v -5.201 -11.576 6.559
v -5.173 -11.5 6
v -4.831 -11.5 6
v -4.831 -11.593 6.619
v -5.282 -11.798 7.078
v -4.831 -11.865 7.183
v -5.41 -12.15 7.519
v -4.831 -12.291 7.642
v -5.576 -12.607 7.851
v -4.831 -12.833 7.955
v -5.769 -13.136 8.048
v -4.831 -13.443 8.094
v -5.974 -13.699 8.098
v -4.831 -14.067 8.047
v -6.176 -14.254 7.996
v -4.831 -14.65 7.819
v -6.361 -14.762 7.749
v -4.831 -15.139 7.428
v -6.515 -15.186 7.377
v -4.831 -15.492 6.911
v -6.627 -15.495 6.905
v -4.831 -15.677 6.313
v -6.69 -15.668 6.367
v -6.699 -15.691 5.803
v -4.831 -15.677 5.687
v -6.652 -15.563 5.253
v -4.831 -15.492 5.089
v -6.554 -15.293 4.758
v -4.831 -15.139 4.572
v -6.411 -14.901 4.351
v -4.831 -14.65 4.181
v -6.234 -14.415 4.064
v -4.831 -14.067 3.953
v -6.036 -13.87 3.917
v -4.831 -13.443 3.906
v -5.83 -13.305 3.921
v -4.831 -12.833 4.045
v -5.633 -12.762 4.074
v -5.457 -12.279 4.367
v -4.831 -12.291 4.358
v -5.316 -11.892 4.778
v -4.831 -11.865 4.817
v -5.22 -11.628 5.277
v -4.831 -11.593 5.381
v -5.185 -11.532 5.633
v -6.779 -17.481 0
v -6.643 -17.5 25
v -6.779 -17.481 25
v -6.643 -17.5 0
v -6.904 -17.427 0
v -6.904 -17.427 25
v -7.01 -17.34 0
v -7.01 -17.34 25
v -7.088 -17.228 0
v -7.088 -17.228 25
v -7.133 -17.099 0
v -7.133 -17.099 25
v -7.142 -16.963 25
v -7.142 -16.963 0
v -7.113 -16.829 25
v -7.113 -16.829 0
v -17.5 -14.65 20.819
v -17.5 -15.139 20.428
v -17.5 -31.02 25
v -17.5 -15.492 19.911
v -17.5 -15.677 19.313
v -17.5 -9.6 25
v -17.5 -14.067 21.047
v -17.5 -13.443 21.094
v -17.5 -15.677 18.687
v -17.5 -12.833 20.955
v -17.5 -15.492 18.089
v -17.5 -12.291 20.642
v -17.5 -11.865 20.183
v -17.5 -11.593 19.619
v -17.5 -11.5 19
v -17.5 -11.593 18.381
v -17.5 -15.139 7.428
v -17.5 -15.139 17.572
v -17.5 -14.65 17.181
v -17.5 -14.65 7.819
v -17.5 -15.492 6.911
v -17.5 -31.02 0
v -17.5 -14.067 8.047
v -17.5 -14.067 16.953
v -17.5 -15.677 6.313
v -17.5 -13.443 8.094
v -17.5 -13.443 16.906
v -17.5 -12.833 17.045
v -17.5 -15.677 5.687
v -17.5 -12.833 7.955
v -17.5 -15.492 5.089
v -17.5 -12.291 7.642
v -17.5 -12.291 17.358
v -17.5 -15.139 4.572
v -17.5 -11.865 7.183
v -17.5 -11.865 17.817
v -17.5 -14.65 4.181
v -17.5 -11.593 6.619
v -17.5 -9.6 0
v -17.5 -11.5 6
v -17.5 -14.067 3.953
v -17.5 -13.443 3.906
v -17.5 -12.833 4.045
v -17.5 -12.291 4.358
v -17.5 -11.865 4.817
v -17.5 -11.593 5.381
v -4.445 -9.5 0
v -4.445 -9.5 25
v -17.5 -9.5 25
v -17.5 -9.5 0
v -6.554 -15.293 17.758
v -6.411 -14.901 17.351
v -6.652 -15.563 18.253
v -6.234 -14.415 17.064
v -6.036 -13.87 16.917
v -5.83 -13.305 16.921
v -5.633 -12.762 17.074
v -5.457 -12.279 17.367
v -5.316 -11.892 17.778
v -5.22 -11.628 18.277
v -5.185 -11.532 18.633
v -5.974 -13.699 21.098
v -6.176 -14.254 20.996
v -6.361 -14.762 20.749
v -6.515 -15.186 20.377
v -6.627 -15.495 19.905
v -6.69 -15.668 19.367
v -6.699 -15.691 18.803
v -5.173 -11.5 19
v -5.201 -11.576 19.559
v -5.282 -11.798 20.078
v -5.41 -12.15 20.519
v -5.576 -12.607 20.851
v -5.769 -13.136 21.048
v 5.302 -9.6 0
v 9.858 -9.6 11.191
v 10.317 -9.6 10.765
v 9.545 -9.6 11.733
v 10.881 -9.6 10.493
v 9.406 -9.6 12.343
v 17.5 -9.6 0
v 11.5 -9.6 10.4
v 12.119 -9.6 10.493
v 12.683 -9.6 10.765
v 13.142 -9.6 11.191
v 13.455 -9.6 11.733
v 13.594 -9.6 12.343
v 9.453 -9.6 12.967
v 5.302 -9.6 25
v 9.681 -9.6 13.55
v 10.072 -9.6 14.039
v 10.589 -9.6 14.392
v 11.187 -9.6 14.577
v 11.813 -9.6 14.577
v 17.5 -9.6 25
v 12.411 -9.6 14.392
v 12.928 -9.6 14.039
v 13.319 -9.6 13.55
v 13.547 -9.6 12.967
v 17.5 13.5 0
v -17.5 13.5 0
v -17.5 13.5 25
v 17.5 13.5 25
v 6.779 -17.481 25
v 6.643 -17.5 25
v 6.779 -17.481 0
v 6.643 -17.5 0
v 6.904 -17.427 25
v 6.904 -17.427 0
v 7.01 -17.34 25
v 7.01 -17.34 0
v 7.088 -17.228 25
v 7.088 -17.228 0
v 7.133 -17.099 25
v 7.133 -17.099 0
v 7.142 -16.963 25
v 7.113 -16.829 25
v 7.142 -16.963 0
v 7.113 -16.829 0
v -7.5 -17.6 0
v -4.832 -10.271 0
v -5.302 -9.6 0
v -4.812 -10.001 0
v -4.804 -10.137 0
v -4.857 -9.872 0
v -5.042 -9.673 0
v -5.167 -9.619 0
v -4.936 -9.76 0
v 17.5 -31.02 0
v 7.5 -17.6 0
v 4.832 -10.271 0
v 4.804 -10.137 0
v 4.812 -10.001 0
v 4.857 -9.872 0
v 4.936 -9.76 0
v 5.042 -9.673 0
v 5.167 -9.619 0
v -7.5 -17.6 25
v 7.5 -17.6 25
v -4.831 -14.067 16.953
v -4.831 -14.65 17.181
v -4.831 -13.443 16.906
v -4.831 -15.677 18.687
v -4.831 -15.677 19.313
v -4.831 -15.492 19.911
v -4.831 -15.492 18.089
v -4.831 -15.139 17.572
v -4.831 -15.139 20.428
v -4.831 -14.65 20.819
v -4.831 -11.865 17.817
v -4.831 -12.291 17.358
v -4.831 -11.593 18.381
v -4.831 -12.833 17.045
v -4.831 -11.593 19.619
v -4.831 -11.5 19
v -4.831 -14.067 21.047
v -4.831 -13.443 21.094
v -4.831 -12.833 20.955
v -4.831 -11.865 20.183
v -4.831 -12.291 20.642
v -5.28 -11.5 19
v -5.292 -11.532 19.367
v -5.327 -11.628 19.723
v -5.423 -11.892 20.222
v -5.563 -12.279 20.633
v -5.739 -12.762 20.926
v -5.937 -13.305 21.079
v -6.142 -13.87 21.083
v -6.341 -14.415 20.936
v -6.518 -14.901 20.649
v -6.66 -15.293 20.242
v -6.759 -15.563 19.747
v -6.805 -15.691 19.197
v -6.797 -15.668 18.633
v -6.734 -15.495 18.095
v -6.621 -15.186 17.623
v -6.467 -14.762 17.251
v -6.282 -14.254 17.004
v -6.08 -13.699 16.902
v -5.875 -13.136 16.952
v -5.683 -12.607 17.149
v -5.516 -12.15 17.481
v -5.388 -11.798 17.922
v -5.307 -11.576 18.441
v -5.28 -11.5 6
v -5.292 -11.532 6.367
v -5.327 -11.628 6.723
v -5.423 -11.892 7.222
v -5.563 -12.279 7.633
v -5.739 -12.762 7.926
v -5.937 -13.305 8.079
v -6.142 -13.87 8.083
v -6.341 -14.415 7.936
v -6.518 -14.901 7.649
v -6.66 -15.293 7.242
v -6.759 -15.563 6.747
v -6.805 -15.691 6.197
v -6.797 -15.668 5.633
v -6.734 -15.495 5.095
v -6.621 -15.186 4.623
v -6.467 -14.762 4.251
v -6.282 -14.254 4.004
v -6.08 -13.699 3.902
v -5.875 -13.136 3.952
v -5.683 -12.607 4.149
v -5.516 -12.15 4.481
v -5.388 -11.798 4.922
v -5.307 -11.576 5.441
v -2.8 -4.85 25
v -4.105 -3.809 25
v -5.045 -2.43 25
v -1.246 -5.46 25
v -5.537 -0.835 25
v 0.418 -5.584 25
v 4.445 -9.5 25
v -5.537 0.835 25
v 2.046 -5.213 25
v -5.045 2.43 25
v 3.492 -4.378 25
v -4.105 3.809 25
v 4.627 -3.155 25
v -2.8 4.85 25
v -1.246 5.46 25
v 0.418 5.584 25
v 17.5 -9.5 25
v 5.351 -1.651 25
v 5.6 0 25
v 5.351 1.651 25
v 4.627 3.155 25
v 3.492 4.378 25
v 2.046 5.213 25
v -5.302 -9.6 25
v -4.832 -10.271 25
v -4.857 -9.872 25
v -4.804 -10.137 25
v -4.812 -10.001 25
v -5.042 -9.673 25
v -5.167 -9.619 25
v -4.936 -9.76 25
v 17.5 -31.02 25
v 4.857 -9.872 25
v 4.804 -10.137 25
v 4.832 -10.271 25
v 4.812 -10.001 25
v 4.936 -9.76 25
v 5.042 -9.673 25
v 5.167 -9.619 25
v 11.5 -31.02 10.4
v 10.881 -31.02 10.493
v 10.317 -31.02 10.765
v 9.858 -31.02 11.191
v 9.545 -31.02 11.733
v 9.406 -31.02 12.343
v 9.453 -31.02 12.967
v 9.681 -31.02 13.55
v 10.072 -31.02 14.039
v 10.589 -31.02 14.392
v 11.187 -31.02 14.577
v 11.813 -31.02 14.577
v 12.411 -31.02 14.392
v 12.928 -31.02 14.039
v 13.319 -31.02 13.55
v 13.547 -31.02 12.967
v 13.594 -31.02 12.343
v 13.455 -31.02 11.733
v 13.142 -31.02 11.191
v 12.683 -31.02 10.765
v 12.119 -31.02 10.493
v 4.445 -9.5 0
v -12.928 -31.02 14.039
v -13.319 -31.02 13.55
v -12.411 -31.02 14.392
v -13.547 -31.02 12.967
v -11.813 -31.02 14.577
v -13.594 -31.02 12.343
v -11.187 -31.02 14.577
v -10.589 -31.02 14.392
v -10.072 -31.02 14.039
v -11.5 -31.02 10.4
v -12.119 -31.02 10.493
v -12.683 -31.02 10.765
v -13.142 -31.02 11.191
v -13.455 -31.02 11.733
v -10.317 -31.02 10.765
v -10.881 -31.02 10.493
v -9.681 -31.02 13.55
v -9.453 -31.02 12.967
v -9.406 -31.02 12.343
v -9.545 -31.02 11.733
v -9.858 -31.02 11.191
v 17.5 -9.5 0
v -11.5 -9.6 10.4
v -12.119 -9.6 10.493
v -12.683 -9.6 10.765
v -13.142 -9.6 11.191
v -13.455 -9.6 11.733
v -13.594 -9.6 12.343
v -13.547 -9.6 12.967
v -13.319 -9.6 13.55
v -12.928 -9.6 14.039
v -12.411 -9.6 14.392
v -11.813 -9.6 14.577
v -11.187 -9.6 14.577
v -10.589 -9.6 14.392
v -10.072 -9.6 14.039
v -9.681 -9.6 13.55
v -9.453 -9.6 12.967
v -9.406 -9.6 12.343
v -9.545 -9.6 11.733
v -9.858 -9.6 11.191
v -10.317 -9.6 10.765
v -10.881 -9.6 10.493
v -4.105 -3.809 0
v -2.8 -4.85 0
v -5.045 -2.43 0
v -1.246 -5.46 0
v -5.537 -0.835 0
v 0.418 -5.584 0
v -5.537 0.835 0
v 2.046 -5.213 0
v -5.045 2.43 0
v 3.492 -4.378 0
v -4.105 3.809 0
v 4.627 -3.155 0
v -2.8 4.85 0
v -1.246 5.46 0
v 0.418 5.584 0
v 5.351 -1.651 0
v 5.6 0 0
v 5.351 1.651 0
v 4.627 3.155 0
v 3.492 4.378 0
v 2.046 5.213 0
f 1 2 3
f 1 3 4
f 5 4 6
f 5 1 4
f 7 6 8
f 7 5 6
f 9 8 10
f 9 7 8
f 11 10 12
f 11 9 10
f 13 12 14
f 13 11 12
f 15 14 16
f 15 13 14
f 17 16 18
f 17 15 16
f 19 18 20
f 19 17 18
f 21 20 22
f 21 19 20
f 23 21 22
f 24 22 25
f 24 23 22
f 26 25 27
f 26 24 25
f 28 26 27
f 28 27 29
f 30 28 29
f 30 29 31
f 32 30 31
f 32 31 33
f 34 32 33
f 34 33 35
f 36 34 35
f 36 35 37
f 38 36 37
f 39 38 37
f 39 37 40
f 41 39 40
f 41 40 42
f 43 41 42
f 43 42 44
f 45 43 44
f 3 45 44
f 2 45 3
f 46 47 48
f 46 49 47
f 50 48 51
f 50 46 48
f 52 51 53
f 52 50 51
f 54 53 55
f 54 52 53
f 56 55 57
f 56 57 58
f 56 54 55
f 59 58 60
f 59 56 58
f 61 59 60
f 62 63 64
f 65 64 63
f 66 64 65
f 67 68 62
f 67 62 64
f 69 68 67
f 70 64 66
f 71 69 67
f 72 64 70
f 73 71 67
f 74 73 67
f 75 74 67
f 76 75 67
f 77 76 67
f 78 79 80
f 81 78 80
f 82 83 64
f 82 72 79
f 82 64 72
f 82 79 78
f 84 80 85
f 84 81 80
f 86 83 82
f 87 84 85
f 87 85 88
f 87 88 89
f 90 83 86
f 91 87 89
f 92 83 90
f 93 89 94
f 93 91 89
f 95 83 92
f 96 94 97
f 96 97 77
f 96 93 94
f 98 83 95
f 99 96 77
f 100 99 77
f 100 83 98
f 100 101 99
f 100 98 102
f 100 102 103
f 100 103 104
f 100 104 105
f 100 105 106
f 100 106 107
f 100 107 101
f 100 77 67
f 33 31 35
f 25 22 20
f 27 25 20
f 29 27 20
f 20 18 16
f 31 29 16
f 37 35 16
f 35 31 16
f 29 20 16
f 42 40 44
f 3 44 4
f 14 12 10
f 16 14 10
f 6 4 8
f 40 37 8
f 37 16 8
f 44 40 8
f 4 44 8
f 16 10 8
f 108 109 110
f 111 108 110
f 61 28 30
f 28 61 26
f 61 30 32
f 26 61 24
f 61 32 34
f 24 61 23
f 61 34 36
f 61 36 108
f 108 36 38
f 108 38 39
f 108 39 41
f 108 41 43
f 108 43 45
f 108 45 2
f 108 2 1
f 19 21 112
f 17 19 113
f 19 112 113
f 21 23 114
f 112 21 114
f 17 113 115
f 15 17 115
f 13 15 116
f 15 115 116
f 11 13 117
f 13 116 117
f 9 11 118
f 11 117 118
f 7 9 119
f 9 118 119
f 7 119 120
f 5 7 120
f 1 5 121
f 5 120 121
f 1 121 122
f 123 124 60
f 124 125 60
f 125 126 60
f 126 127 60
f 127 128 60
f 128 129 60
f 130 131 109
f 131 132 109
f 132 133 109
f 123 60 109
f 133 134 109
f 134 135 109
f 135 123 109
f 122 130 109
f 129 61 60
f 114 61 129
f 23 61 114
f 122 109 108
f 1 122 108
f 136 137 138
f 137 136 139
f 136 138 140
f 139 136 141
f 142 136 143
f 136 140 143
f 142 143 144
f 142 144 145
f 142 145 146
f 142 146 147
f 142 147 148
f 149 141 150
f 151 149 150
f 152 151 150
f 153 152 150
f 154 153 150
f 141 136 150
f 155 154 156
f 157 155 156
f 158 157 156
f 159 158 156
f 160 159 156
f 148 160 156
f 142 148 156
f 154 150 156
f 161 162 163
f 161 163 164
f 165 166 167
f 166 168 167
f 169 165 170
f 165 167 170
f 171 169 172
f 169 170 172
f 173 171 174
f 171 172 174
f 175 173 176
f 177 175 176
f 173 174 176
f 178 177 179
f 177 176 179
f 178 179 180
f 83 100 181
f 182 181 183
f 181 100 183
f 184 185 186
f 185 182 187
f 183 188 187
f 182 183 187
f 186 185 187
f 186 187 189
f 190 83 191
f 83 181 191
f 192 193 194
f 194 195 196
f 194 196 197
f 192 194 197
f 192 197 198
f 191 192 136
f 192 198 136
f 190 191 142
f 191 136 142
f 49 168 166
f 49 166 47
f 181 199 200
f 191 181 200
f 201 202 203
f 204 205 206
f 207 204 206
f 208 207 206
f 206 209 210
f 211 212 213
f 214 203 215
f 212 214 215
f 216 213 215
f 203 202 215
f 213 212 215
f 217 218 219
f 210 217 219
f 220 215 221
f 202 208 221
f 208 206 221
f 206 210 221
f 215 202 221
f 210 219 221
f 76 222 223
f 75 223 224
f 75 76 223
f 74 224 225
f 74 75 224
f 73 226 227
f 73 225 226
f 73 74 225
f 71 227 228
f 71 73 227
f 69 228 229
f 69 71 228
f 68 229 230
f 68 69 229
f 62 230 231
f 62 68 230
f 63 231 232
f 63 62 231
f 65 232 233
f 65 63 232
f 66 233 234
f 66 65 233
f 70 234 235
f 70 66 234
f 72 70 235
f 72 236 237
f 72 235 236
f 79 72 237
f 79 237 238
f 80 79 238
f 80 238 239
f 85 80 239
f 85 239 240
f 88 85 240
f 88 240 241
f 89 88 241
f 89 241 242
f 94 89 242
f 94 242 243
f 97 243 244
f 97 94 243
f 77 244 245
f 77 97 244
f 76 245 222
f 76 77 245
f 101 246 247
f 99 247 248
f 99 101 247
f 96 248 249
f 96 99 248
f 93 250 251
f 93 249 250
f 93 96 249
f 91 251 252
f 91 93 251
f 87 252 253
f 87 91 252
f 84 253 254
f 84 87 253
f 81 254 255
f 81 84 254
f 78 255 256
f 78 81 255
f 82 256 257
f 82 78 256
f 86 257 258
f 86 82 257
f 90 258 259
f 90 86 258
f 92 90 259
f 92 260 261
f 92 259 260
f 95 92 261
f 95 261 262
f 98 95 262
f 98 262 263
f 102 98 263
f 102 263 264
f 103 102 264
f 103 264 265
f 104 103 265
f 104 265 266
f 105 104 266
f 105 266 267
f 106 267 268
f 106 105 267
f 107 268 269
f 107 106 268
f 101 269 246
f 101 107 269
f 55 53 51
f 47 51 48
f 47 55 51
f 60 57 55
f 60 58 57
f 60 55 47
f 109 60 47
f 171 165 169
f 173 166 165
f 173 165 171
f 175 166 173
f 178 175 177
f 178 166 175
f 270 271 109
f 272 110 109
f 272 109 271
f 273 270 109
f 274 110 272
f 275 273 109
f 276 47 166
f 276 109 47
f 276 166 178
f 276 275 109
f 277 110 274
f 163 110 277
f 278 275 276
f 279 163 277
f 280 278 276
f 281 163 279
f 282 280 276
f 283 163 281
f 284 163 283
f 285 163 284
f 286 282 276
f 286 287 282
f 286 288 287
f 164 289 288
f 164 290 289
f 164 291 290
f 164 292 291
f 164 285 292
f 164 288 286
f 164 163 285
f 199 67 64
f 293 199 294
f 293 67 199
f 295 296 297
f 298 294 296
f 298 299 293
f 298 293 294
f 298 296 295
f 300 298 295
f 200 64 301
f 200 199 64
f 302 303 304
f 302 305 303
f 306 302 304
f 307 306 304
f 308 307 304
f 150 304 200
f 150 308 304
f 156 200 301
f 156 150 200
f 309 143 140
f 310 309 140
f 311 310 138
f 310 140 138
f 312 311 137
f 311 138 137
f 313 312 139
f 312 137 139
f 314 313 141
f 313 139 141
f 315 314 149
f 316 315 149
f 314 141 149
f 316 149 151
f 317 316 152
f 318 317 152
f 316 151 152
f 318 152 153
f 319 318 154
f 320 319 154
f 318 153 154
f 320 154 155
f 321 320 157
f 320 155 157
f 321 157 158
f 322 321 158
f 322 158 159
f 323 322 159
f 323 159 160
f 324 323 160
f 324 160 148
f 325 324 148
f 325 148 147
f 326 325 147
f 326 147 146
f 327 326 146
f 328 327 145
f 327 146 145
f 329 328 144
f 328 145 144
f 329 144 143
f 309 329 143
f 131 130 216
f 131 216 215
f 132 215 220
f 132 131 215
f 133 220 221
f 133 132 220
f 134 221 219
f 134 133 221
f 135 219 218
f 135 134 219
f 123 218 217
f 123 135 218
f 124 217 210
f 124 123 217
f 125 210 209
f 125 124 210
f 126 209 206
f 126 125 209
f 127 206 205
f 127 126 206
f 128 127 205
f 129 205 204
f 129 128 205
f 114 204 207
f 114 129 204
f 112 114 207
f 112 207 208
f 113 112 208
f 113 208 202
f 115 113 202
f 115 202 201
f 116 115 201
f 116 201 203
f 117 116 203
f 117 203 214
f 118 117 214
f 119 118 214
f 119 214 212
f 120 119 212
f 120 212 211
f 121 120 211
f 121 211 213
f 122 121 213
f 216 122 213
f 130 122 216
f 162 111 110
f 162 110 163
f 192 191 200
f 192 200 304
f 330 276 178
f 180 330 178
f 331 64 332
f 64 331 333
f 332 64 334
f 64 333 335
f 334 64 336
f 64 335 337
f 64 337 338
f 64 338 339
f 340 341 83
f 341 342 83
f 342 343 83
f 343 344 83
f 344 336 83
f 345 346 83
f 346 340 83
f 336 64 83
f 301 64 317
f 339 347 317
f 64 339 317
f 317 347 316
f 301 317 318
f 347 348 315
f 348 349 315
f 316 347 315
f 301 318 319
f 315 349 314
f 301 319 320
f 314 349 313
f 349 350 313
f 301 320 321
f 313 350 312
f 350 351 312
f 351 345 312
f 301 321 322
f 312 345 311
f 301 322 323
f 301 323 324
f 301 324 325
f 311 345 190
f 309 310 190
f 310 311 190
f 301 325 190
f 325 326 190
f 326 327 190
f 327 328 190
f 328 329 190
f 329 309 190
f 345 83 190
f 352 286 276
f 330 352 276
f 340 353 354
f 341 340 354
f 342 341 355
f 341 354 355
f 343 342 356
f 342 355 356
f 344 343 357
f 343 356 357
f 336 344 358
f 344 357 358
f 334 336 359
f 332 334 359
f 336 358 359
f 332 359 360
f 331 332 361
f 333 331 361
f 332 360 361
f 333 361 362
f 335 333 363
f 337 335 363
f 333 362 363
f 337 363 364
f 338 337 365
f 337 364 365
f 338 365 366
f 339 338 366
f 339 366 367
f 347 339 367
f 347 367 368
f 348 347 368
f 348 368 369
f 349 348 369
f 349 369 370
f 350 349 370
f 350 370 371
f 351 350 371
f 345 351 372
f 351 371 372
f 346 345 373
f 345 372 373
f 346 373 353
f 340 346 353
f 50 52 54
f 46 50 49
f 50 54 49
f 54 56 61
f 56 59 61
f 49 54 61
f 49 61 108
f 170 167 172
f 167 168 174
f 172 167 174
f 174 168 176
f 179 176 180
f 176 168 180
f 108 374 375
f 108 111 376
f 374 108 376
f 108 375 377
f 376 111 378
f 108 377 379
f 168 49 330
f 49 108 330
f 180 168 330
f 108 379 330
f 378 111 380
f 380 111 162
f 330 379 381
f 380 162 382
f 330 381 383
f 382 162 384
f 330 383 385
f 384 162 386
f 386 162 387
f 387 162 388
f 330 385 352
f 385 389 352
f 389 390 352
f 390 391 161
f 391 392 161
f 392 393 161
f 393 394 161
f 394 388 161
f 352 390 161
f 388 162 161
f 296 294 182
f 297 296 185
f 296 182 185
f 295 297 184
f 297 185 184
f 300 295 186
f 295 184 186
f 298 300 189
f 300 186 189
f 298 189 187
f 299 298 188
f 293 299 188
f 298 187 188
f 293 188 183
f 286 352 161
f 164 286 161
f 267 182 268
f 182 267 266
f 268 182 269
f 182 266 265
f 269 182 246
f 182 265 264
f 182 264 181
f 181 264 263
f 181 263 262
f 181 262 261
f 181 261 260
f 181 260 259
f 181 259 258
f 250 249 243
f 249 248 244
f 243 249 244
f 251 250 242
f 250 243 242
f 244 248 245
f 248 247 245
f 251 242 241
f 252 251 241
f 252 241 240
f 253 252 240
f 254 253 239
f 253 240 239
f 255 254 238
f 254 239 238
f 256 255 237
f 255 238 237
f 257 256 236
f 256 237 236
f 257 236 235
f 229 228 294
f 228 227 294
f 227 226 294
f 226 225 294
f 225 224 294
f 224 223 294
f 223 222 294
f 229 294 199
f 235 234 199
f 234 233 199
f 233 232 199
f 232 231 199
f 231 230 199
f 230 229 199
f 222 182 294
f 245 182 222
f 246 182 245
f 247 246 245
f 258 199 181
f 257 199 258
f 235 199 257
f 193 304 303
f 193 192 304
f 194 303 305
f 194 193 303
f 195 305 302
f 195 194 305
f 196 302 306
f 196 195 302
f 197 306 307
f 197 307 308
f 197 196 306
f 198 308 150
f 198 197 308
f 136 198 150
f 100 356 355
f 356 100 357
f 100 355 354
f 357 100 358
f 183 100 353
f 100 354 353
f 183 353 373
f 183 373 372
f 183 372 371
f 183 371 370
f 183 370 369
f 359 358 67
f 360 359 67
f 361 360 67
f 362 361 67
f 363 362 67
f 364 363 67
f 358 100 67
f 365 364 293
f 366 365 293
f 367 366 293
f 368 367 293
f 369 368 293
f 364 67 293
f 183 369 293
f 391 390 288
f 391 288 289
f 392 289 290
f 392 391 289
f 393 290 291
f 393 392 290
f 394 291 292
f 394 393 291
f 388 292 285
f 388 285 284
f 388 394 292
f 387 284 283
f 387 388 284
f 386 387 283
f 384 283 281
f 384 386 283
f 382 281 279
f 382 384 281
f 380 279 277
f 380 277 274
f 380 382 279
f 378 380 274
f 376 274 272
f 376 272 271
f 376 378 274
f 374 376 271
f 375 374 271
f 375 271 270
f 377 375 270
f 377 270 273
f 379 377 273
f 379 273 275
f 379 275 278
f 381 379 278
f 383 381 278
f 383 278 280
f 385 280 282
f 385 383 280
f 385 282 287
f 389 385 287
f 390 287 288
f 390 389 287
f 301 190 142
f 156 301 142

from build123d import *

# Parameters (mm, degrees)
SKETCH1_W                      = 35
SKETCH1_H                      = 44.52
SKETCH1_R                      = 5.6
BOSS_EXTRUDE1_DEPTH            = 25
CUT_EXTRUDE_THIN3_DEPTH        = 30.1
FILLET1_R                      = 0.5
FILLET2_R                      = 0.5
FILLET3_R                      = 0.5
FILLET4_R                      = 0.5
SKETCH6_W                      = 2.1
SKETCH6_H                      = 44.52
M5X0_8_TAPPED_HOLE1_AT_2_COUNT = 2
M5X0_8_TAPPED_HOLE1_AT_2_PITCH = 23
M5X0_8_START                   = -17.5
M5X0_8_TAPPED_HOLE2_OUTLINE_R  = 2.1
M5X0_8_TAPPED_HOLE2_DEPTH      = 12.668534181


# Read off the part's stored shape, not the designer's step: M5x0.8 Tapped Hole2
with BuildPart() as part:
    # Sketch1 → Boss-Extrude1 (new body)
    with BuildSketch(Plane.XY):
        with Locations((0, -8.76)):
            Rectangle(SKETCH1_W, SKETCH1_H)
        Circle(SKETCH1_R, mode=Mode.SUBTRACT)
    extrude(amount=BOSS_EXTRUDE1_DEPTH)

    # Sketch7 → Cut-Extrude-Thin3 (cut)
    with BuildSketch(Plane.XY.offset(25)):
        Polygon((-17.5, -9.6), (-4.588238126, -9.6), (-7.5, -17.6), (7.5, -17.6), (4.588238126, -9.6), (17.5, -9.6), (17.5, -9.5), (4.445423325, -9.5), (7.357185199, -17.5), (-7.357185199, -17.5), (-4.445423325, -9.5), (-17.5, -9.5), align=None)
    extrude(amount=-CUT_EXTRUDE_THIN3_DEPTH, mode=Mode.SUBTRACT)


with BuildPart() as cut_extrude_thin3_piece_1:
    # of the separate pieces the step leaves, piece 1, a body of its own (cut_extrude_thin3_pieces)
    add(part.part.solids().sort_by_distance((-17.5, 13.5, 0))[0])

    # Fillet1
    fillet1_edges = [cut_extrude_thin3_piece_1.edges().sort_by_distance(p)[0] for p in [
        (-7.357185199, -17.5, 12.5),
    ]]
    fillet(fillet1_edges, radius=FILLET1_R)

    # Fillet2
    fillet2_edges = [cut_extrude_thin3_piece_1.edges().sort_by_distance(p)[0] for p in [
        (7.357185199, -17.5, 12.5),
    ]]
    fillet(fillet2_edges, radius=FILLET2_R)


with BuildPart() as cut_extrude_thin3_piece_2:
    # of the separate pieces the step leaves, piece 2, a body of its own (cut_extrude_thin3_pieces)
    add(part.part.solids().sort_by_distance((-17.5, -31.02, 0))[0])

    # Fillet3
    fillet3_edges = [cut_extrude_thin3_piece_2.edges().sort_by_distance(p)[0] for p in [
        (4.588238126, -9.6, 12.5),
    ]]
    fillet(fillet3_edges, radius=FILLET3_R)

    # Fillet4
    fillet4_edges = [cut_extrude_thin3_piece_2.edges().sort_by_distance(p)[0] for p in [
        (-4.588238126, -9.6, 12.5),
    ]]
    fillet(fillet4_edges, radius=FILLET4_R)

    # Sketch6 → M5x0.8 Tapped Hole1 (revolve, cut)
    with BuildSketch(Plane(origin=(11.5, -31.02, 12.5), x_dir=(0, 0, -1), z_dir=(1, 0, 0))):
        with Locations((1.05, 22.26)):
            Rectangle(SKETCH6_W, SKETCH6_H)
    m5x0_8_tapped_hole1 = revolve(axis=Axis((11.5, -37.37, 12.5), (0, 1, 0)), mode=Mode.SUBTRACT)

    # M5x0.8 Tapped Hole1 at 2: M5x0.8 Tapped Hole1 ×2
    with Locations(*[(-i * M5X0_8_TAPPED_HOLE1_AT_2_PITCH, 0, 0) for i in range(1, M5X0_8_TAPPED_HOLE1_AT_2_COUNT)]):
        add(m5x0_8_tapped_hole1, mode=Mode.SUBTRACT)


with BuildPart() as m5x0_8_tapped_hole2_tool:
    # M5x0.8 Tapped Hole2 outline → M5x0.8 Tapped Hole2 (new body)
    with BuildSketch(Plane.YZ.offset(M5X0_8_START)):
        with Locations((-13.6, 6)):
            Circle(M5X0_8_TAPPED_HOLE2_OUTLINE_R)
        with Locations((-13.6, 19)):
            Circle(M5X0_8_TAPPED_HOLE2_OUTLINE_R)
    extrude(amount=M5X0_8_TAPPED_HOLE2_DEPTH)


with BuildPart() as cut_extrude_thin3_piece_1_1:
    add(cut_extrude_thin3_piece_1.part)

    # M5x0.8 Tapped Hole2: cut by m5x0_8_tapped_hole2_tool
    add(m5x0_8_tapped_hole2_tool.part, mode=Mode.SUBTRACT)


with BuildPart() as cut_extrude_thin3_piece_2_1:
    add(cut_extrude_thin3_piece_2.part)

    # M5x0.8 Tapped Hole2: cut by m5x0_8_tapped_hole2_tool
    add(m5x0_8_tapped_hole2_tool.part, mode=Mode.SUBTRACT)


solid = Compound([cut_extrude_thin3_piece_1_1.part, cut_extrude_thin3_piece_2_1.part])
